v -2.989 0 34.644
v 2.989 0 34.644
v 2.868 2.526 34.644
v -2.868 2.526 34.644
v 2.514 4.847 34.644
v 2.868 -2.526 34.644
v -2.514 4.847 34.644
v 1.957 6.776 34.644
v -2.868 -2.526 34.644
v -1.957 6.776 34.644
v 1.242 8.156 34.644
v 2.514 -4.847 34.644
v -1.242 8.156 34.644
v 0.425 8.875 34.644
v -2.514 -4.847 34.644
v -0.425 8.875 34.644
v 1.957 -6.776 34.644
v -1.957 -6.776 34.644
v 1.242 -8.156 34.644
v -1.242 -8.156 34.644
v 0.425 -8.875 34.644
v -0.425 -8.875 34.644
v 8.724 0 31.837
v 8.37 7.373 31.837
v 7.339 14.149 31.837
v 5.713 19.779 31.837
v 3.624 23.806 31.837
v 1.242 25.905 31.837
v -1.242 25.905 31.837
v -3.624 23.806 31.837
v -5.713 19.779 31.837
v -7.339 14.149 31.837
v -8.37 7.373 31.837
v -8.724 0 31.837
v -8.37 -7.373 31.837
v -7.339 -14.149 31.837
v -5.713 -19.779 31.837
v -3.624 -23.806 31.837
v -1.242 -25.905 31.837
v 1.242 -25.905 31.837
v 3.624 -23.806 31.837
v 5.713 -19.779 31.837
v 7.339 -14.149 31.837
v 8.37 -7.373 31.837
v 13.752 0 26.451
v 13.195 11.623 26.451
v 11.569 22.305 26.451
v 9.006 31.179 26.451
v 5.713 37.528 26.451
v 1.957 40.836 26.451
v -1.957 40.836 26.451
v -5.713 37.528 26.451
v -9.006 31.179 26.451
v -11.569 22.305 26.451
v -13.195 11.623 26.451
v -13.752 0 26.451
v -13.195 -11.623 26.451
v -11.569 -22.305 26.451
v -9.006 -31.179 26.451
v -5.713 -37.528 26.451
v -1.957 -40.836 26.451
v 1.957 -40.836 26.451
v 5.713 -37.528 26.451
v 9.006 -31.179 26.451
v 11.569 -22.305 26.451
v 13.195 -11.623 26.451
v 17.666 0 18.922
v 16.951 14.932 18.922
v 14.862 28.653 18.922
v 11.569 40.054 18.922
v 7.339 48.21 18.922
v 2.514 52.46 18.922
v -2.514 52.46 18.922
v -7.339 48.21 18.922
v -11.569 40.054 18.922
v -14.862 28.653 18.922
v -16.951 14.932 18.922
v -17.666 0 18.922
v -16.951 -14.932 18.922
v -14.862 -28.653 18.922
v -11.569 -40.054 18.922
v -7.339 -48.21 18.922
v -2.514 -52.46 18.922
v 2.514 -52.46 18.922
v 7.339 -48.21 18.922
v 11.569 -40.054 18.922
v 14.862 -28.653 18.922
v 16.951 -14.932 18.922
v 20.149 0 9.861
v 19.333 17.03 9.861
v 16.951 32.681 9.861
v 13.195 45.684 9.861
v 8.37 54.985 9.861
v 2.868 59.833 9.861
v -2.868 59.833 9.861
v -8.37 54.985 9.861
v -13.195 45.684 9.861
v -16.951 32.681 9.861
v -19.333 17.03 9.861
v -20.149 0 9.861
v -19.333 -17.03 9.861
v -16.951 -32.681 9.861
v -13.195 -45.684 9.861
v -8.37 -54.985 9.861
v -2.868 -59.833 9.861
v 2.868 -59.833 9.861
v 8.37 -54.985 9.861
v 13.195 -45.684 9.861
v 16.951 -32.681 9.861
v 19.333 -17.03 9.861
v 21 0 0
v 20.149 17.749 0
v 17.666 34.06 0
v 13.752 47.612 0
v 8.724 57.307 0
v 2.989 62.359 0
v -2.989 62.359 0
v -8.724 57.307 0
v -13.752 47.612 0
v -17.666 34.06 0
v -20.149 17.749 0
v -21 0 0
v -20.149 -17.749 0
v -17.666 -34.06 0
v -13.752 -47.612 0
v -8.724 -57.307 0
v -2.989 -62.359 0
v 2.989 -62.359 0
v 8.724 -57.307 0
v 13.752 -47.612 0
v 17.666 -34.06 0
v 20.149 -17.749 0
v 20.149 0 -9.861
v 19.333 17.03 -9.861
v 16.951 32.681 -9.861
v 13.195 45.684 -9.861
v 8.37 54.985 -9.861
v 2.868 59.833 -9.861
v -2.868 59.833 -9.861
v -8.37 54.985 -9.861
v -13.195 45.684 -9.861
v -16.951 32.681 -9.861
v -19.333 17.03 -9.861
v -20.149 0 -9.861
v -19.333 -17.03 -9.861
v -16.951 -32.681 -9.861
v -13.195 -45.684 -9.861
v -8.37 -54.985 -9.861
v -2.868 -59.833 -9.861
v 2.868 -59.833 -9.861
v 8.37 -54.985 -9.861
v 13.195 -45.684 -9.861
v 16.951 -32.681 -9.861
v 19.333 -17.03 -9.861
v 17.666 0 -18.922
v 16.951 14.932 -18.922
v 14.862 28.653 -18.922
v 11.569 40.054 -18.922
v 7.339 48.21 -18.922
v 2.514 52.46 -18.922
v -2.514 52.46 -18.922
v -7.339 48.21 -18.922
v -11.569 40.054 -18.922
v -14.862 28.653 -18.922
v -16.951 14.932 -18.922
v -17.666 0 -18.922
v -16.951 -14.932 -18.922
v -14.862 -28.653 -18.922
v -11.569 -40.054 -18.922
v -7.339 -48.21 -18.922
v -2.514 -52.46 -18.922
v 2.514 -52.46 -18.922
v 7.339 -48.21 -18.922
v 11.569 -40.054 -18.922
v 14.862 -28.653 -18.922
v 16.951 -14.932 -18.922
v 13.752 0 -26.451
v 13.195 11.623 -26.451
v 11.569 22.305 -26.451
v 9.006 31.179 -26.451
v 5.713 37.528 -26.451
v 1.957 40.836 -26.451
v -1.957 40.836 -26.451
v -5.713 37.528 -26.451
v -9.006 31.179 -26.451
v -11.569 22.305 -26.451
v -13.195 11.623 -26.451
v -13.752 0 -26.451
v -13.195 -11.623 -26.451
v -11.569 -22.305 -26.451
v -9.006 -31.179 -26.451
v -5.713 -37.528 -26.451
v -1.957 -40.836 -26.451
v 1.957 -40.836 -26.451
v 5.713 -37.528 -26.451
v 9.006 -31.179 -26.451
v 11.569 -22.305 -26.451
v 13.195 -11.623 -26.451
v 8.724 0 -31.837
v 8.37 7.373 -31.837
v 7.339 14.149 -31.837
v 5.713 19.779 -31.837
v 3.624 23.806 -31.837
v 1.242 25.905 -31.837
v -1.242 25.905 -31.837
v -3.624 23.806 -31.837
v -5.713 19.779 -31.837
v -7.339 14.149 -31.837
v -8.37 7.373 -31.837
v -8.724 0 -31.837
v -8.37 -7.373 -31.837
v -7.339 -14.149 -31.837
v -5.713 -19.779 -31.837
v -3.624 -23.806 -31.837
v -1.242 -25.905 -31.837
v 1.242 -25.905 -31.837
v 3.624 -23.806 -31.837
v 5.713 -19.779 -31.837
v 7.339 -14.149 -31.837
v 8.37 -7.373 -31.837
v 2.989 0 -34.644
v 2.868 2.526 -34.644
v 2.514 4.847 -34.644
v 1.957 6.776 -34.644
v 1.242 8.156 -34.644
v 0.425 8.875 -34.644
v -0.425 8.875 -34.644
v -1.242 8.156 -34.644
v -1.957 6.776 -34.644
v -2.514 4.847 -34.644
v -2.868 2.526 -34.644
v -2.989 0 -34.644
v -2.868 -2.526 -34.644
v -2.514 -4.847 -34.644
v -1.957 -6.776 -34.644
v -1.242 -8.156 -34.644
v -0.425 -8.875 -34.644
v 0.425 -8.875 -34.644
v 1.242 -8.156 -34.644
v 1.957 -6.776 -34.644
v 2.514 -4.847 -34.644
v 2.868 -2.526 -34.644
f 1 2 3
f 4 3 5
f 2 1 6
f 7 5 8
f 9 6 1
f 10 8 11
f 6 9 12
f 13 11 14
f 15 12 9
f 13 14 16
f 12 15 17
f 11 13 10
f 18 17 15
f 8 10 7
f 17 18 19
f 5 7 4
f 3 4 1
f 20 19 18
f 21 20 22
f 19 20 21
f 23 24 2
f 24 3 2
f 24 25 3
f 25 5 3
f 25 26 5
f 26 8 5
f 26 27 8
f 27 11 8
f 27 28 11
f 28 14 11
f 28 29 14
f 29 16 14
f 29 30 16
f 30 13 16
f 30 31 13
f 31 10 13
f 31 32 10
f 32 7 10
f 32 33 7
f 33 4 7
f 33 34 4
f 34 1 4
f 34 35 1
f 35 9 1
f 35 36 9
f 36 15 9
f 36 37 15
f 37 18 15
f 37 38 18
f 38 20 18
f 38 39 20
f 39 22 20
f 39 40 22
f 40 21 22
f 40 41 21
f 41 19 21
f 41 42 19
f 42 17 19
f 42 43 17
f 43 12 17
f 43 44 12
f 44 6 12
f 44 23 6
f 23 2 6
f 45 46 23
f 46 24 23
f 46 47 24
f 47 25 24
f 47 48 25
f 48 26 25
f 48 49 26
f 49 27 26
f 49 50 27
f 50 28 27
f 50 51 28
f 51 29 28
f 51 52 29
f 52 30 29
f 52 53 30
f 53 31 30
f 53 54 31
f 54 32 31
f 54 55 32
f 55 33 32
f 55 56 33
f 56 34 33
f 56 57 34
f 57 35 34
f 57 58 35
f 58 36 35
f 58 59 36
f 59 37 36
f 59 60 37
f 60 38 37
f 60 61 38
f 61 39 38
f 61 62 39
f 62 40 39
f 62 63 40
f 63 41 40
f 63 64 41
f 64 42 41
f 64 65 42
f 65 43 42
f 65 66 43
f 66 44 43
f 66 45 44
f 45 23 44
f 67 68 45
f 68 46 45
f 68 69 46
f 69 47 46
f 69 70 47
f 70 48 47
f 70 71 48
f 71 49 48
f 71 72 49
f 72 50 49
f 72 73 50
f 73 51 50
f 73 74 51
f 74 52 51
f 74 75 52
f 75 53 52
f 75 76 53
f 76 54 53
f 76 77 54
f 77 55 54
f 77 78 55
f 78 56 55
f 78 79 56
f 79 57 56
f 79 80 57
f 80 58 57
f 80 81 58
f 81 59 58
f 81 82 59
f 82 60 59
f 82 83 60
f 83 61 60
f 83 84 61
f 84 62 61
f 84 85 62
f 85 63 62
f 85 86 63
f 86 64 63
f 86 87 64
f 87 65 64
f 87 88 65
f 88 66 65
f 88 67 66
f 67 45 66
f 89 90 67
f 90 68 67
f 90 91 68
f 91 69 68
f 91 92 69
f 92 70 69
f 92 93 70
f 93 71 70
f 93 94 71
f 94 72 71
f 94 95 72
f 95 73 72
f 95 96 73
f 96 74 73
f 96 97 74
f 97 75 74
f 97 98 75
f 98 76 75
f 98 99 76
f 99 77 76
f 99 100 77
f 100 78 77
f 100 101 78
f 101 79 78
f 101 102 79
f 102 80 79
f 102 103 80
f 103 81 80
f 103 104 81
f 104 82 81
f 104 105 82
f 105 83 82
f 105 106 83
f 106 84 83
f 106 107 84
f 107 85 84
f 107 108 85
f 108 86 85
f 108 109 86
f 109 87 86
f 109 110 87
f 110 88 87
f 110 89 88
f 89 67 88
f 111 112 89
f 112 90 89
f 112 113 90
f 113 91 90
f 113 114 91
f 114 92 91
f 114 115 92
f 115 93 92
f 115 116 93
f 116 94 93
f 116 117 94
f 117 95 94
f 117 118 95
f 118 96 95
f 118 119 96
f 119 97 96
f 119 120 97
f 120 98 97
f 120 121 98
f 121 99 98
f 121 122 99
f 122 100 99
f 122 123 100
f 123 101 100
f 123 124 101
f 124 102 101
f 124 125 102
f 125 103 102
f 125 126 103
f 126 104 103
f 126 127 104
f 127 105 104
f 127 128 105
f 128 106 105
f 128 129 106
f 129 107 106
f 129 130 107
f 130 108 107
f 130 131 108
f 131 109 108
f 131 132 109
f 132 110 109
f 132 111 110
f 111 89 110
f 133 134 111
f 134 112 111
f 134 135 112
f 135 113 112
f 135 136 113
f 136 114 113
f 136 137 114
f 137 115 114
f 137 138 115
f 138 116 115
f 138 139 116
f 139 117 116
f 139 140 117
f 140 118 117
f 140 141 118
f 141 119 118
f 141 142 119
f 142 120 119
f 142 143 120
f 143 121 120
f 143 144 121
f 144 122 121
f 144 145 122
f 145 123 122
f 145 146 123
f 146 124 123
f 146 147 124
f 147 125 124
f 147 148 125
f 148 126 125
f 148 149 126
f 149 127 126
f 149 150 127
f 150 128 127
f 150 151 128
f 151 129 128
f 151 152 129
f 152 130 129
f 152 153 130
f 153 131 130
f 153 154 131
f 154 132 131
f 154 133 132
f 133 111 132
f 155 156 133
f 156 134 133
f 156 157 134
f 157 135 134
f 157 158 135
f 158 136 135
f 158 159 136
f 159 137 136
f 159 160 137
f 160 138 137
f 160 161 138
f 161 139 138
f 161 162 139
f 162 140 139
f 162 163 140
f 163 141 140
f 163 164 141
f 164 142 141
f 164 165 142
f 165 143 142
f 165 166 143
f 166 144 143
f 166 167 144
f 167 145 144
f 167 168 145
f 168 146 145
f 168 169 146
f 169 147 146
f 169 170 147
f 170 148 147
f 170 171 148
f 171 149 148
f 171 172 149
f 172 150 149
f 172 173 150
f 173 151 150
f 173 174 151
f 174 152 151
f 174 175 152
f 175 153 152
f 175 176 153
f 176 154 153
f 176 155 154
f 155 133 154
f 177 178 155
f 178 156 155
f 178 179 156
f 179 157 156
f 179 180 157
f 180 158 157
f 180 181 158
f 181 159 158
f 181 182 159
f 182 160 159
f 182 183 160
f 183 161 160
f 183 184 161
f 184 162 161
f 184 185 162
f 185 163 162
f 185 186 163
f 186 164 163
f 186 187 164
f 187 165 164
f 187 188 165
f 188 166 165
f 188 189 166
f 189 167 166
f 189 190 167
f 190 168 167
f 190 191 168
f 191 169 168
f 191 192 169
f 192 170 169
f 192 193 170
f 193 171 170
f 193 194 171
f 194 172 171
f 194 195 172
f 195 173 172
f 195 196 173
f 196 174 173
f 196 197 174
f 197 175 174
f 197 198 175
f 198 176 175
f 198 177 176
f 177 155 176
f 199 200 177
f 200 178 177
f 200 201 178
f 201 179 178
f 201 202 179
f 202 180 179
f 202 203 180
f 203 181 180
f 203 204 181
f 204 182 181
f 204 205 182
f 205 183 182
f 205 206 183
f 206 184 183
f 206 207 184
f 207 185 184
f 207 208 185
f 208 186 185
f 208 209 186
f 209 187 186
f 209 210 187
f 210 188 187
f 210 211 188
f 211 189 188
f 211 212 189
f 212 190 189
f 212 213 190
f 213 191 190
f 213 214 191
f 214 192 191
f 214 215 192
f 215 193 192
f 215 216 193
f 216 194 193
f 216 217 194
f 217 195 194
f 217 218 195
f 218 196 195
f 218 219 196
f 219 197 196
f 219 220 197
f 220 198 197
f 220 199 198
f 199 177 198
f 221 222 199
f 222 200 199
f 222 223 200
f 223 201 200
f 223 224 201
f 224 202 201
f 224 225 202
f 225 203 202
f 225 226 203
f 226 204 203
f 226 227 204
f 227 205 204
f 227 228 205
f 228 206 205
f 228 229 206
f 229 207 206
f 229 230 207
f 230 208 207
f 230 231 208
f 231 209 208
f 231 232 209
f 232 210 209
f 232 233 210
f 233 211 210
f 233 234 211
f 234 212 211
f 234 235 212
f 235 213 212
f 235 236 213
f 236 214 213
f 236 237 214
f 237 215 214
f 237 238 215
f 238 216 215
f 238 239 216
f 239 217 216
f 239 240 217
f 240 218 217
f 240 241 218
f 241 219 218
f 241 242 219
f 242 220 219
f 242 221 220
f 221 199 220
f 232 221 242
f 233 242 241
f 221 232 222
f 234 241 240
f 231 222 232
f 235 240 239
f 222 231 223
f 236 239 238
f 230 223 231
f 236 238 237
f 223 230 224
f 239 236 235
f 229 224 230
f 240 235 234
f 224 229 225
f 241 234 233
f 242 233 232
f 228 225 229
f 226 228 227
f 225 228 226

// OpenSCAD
// Generated by SolidPython 1.0.1 on 2020-07-29 00:46:45


scale(v = [3, 9, 5]) {
	sphere(r = 7);
}
/***********************************************
*********      SolidPython code:      **********
************************************************
 
# import packages: SolidPython
from solid import *
from solid.utils import *
from itertools import chain, combinations, permutations


class Resize:

    def __init__(self, scad_file):
        self.scad_file = scad_file
        #self.scad_file = import_scad(scad_file)
        # cone/cylinder param:
        self.r1 = 0
        self.r2 = 0
        self.h = 0
        # rectangular prism param:
        self.w = 0
        self.l = 0
        # ellipse param:
        self.r = 0

    # import OpenScad code (file name corresponds to shape)


    # classify shape + parameters
    def assign(self, param1, param2, param3):
        if self.scad_file == 'cone.scad':
            self.r1 = param1
            self.r2 = param2
            self.h = param3
        elif self.scad_file == 'cylinder.scad':
            self.r1 = param1
            self.r2 = param2
            self.h = param3
        elif self.scad_file == 'rectangularPrism.scad':
            self.h = param1
            self.l = param2
            self.w = param3
        else:
            self.r = param1
            self.h = param2

    # resize parameters
    def iterate(self):
        x = range(3, 20, 2)
        i = 1
        if self.scad_file == 'cone.scad':
            tempList = list(permutations(x, 2))
            for temp in tempList:
                param1 = temp[0]
                param2 = temp[1]
                filepath = 'produced_scad_files/' + 'cone' + str(param1) + '_' + str(param2) + '_' + '.scad'
                scad_render_to_file(cylinder(h=param1, r1=param2, r2=0), filepath)

        elif self.scad_file == 'cylinder.scad':
            tempList = list(permutations(x, 3))
            for temp in tempList:
                param1 = temp[0]
                param2 = temp[1]
                filepath = 'produced_scad_files/' + 'cylinder' + str(param1) + '_' + str(param2) + '_' + '.scad'
                scad_render_to_file(cylinder(h=param1, r1=param2, r2=param2), filepath)

        elif self.scad_file == 'rectangularPrism.scad':
            tempList = list(permutations(x, 3))
            for temp in tempList:
                param1 = temp[0]
                param2 = temp[1]
                param3 = temp[2]
                filepath = 'produced_scad_files/' + 'rectangularPrism' + str(param1) + '_' + str(param2) + '_' + str(
                    param3) + '.scad'
                scad_render_to_file(cube(size=(param1, param2, param3)), filepath)

        elif self.scad_file == 'ellipse.scad':
            tempList = list(permutations(x, 4))
            for temp in tempList:
                param1 = temp[0]
                param2 = temp[1]
                param3 = temp[2]
                param4 = temp[3]
                filepath = 'produced_scad_files/' + 'ellipse' + str(param1) + '_' + str(param2) + '_' + str(param3) + '_' + str(param4) + '.scad'
                scad_render_to_file(scale([param1, param2, param3])(sphere(r=param4)), filepath)

    def render_to_scadfile(self):
        scad_render_to_file(scad, 'example.scad') 
 
************************************************/
